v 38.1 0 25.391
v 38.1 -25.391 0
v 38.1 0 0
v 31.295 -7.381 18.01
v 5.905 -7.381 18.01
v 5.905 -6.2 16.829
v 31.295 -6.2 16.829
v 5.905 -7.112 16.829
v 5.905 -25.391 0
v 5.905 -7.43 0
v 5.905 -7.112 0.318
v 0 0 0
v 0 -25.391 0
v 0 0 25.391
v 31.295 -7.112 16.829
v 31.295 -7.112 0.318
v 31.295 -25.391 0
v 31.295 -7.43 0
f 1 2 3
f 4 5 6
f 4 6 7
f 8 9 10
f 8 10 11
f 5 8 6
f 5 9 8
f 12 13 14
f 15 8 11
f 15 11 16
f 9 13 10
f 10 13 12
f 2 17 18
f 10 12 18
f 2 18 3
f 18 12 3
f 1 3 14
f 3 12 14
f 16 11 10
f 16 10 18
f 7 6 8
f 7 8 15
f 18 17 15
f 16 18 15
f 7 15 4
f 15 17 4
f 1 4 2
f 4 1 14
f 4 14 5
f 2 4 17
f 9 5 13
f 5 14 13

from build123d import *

# Parameters (mm, degrees)
F1_DEPTH = 38.1
F2_W     = 25.3906301223
F2_H     = 25.4694648265
F3_DEPTH = 12.7
F4_W     = 25.981107261
F4_H     = 16.8286710978
F5_DEPTH = 7.112


with BuildPart() as f1:
    # F0 (on Right) → F1 (new body)
    with BuildSketch(Plane.YZ):
        Polygon((-25.3906268626, 0), (0, 0), (0, 25.3906268626), align=None)
    extrude(amount=F1_DEPTH)

    # F2 (on face) → F3 (cut, symmetric)
    with BuildSketch(Plane(origin=(0, -12.6953134313, 12.6953134313), x_dir=(1, 0, 0), z_dir=(0, -0.7071067812, 0.7071067812))):
        with Locations((18.6001111288, -5.2191520199)):
            Rectangle(F2_W, F2_H)
    extrude(amount=F3_DEPTH, both=True, mode=Mode.SUBTRACT)

    # F4 (on Front) → F5 (join)
    with BuildSketch(Plane.XZ):
        with Locations((18.8953496981, 8.4143355489)):
            Rectangle(F4_W, F4_H)
    extrude(amount=F5_DEPTH)


solid = f1.part
